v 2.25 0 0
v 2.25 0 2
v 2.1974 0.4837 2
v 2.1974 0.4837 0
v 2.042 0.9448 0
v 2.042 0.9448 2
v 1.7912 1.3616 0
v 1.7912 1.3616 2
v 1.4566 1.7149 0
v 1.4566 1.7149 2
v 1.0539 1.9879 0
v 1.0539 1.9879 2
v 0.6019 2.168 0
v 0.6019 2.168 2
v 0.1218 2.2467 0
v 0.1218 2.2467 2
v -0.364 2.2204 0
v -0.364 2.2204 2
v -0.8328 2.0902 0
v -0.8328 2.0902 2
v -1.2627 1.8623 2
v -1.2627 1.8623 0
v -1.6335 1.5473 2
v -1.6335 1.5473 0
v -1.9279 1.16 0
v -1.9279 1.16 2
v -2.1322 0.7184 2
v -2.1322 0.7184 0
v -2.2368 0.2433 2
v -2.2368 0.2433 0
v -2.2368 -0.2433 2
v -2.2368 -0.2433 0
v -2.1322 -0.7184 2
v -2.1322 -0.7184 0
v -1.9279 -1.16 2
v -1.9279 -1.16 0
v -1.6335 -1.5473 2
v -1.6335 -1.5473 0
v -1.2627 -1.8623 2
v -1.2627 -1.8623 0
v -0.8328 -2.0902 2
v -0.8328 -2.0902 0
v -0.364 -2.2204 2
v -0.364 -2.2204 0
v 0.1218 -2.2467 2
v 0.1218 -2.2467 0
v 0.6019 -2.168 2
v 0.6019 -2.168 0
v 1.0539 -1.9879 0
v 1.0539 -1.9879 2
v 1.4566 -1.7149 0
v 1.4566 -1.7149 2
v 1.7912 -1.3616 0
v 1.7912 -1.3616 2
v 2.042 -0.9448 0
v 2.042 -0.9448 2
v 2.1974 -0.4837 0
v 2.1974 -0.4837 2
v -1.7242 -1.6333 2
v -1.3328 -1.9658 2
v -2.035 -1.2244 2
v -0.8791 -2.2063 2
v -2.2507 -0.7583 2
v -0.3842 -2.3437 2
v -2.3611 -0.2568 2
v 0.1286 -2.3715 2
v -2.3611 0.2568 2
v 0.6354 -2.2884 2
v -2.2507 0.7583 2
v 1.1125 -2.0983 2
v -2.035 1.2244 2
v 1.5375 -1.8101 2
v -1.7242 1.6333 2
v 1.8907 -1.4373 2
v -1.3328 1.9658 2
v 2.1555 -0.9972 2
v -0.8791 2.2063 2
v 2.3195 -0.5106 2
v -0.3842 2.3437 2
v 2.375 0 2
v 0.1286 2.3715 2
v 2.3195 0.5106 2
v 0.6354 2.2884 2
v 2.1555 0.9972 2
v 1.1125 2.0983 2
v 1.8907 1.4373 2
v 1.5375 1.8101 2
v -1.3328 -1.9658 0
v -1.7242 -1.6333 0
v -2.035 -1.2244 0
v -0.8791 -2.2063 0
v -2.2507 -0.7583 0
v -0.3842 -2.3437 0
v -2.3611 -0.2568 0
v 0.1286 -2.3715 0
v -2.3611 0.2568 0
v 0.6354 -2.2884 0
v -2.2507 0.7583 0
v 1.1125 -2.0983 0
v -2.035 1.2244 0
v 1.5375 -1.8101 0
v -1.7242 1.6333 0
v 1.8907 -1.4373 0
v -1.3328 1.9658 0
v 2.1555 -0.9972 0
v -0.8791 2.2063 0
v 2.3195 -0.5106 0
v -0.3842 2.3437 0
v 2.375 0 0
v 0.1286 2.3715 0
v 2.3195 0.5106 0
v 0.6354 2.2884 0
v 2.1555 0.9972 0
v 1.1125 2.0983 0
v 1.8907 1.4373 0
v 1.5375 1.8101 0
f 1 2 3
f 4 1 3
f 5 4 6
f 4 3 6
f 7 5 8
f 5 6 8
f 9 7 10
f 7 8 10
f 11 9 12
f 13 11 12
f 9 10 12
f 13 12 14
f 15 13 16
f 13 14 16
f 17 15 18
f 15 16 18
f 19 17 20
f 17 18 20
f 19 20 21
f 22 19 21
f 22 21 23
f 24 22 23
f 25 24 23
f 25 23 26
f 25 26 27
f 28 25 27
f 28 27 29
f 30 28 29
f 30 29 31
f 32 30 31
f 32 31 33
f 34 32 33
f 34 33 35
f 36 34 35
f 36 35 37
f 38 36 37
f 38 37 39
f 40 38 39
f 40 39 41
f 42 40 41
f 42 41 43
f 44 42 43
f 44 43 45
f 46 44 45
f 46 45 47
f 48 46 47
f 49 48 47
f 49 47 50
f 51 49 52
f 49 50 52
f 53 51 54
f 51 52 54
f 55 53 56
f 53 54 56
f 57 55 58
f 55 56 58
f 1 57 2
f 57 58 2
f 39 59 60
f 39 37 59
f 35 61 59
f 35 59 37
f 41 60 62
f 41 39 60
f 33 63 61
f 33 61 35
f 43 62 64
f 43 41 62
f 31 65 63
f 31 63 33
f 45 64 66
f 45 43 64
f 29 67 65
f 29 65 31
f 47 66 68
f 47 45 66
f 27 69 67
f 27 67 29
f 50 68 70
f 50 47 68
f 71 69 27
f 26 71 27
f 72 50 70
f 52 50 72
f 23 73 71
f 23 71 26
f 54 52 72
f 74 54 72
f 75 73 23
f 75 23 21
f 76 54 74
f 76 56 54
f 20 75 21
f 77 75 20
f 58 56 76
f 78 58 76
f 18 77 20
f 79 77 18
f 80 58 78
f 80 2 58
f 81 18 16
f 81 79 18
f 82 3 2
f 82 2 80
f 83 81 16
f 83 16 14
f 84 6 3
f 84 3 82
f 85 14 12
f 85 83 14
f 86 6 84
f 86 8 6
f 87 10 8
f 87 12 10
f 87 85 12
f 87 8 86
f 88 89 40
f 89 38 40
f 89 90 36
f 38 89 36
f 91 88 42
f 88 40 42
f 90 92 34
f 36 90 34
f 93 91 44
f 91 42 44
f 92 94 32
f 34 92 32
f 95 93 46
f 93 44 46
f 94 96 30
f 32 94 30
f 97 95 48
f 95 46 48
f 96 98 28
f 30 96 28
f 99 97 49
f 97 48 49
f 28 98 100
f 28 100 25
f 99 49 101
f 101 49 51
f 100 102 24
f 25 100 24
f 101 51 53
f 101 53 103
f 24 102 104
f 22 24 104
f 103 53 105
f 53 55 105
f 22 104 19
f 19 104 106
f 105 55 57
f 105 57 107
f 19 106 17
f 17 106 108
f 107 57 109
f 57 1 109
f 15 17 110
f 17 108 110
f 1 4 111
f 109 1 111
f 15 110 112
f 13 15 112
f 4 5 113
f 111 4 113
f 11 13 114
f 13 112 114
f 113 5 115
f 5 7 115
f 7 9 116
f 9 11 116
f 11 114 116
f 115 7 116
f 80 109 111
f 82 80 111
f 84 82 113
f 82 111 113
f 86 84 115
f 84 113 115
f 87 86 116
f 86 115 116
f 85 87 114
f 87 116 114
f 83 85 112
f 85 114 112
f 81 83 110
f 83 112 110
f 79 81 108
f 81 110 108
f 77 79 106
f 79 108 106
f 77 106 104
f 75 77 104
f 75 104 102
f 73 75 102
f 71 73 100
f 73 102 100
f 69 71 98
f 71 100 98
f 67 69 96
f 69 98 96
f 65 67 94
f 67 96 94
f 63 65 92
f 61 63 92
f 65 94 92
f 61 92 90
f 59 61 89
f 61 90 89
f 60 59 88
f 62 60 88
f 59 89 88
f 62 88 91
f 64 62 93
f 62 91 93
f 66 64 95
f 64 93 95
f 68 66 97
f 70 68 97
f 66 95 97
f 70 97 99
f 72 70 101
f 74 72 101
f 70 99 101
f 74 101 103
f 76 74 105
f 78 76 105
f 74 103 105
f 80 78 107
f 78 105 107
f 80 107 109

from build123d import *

# Parameters (mm, degrees)
F0_R     = 4.75
F1_DEPTH = 4
F2_SCALE = 0.5
F3_R     = 2.25
F4_DEPTH = 25


with BuildPart() as f1:
    # F0 (on Top) → F1 (new body)
    with BuildSketch(Plane.XY):
        Circle(F0_R)
    extrude(amount=F1_DEPTH)


with BuildPart() as f1_1:
    # F2: moved
    add(f1.part.scale(F2_SCALE))

    # F3 (on face) → F4 (cut)
    with BuildSketch(Plane.XY.offset(2)):
        Circle(F3_R)
    extrude(amount=-F4_DEPTH, mode=Mode.SUBTRACT)


solid = f1_1.part
